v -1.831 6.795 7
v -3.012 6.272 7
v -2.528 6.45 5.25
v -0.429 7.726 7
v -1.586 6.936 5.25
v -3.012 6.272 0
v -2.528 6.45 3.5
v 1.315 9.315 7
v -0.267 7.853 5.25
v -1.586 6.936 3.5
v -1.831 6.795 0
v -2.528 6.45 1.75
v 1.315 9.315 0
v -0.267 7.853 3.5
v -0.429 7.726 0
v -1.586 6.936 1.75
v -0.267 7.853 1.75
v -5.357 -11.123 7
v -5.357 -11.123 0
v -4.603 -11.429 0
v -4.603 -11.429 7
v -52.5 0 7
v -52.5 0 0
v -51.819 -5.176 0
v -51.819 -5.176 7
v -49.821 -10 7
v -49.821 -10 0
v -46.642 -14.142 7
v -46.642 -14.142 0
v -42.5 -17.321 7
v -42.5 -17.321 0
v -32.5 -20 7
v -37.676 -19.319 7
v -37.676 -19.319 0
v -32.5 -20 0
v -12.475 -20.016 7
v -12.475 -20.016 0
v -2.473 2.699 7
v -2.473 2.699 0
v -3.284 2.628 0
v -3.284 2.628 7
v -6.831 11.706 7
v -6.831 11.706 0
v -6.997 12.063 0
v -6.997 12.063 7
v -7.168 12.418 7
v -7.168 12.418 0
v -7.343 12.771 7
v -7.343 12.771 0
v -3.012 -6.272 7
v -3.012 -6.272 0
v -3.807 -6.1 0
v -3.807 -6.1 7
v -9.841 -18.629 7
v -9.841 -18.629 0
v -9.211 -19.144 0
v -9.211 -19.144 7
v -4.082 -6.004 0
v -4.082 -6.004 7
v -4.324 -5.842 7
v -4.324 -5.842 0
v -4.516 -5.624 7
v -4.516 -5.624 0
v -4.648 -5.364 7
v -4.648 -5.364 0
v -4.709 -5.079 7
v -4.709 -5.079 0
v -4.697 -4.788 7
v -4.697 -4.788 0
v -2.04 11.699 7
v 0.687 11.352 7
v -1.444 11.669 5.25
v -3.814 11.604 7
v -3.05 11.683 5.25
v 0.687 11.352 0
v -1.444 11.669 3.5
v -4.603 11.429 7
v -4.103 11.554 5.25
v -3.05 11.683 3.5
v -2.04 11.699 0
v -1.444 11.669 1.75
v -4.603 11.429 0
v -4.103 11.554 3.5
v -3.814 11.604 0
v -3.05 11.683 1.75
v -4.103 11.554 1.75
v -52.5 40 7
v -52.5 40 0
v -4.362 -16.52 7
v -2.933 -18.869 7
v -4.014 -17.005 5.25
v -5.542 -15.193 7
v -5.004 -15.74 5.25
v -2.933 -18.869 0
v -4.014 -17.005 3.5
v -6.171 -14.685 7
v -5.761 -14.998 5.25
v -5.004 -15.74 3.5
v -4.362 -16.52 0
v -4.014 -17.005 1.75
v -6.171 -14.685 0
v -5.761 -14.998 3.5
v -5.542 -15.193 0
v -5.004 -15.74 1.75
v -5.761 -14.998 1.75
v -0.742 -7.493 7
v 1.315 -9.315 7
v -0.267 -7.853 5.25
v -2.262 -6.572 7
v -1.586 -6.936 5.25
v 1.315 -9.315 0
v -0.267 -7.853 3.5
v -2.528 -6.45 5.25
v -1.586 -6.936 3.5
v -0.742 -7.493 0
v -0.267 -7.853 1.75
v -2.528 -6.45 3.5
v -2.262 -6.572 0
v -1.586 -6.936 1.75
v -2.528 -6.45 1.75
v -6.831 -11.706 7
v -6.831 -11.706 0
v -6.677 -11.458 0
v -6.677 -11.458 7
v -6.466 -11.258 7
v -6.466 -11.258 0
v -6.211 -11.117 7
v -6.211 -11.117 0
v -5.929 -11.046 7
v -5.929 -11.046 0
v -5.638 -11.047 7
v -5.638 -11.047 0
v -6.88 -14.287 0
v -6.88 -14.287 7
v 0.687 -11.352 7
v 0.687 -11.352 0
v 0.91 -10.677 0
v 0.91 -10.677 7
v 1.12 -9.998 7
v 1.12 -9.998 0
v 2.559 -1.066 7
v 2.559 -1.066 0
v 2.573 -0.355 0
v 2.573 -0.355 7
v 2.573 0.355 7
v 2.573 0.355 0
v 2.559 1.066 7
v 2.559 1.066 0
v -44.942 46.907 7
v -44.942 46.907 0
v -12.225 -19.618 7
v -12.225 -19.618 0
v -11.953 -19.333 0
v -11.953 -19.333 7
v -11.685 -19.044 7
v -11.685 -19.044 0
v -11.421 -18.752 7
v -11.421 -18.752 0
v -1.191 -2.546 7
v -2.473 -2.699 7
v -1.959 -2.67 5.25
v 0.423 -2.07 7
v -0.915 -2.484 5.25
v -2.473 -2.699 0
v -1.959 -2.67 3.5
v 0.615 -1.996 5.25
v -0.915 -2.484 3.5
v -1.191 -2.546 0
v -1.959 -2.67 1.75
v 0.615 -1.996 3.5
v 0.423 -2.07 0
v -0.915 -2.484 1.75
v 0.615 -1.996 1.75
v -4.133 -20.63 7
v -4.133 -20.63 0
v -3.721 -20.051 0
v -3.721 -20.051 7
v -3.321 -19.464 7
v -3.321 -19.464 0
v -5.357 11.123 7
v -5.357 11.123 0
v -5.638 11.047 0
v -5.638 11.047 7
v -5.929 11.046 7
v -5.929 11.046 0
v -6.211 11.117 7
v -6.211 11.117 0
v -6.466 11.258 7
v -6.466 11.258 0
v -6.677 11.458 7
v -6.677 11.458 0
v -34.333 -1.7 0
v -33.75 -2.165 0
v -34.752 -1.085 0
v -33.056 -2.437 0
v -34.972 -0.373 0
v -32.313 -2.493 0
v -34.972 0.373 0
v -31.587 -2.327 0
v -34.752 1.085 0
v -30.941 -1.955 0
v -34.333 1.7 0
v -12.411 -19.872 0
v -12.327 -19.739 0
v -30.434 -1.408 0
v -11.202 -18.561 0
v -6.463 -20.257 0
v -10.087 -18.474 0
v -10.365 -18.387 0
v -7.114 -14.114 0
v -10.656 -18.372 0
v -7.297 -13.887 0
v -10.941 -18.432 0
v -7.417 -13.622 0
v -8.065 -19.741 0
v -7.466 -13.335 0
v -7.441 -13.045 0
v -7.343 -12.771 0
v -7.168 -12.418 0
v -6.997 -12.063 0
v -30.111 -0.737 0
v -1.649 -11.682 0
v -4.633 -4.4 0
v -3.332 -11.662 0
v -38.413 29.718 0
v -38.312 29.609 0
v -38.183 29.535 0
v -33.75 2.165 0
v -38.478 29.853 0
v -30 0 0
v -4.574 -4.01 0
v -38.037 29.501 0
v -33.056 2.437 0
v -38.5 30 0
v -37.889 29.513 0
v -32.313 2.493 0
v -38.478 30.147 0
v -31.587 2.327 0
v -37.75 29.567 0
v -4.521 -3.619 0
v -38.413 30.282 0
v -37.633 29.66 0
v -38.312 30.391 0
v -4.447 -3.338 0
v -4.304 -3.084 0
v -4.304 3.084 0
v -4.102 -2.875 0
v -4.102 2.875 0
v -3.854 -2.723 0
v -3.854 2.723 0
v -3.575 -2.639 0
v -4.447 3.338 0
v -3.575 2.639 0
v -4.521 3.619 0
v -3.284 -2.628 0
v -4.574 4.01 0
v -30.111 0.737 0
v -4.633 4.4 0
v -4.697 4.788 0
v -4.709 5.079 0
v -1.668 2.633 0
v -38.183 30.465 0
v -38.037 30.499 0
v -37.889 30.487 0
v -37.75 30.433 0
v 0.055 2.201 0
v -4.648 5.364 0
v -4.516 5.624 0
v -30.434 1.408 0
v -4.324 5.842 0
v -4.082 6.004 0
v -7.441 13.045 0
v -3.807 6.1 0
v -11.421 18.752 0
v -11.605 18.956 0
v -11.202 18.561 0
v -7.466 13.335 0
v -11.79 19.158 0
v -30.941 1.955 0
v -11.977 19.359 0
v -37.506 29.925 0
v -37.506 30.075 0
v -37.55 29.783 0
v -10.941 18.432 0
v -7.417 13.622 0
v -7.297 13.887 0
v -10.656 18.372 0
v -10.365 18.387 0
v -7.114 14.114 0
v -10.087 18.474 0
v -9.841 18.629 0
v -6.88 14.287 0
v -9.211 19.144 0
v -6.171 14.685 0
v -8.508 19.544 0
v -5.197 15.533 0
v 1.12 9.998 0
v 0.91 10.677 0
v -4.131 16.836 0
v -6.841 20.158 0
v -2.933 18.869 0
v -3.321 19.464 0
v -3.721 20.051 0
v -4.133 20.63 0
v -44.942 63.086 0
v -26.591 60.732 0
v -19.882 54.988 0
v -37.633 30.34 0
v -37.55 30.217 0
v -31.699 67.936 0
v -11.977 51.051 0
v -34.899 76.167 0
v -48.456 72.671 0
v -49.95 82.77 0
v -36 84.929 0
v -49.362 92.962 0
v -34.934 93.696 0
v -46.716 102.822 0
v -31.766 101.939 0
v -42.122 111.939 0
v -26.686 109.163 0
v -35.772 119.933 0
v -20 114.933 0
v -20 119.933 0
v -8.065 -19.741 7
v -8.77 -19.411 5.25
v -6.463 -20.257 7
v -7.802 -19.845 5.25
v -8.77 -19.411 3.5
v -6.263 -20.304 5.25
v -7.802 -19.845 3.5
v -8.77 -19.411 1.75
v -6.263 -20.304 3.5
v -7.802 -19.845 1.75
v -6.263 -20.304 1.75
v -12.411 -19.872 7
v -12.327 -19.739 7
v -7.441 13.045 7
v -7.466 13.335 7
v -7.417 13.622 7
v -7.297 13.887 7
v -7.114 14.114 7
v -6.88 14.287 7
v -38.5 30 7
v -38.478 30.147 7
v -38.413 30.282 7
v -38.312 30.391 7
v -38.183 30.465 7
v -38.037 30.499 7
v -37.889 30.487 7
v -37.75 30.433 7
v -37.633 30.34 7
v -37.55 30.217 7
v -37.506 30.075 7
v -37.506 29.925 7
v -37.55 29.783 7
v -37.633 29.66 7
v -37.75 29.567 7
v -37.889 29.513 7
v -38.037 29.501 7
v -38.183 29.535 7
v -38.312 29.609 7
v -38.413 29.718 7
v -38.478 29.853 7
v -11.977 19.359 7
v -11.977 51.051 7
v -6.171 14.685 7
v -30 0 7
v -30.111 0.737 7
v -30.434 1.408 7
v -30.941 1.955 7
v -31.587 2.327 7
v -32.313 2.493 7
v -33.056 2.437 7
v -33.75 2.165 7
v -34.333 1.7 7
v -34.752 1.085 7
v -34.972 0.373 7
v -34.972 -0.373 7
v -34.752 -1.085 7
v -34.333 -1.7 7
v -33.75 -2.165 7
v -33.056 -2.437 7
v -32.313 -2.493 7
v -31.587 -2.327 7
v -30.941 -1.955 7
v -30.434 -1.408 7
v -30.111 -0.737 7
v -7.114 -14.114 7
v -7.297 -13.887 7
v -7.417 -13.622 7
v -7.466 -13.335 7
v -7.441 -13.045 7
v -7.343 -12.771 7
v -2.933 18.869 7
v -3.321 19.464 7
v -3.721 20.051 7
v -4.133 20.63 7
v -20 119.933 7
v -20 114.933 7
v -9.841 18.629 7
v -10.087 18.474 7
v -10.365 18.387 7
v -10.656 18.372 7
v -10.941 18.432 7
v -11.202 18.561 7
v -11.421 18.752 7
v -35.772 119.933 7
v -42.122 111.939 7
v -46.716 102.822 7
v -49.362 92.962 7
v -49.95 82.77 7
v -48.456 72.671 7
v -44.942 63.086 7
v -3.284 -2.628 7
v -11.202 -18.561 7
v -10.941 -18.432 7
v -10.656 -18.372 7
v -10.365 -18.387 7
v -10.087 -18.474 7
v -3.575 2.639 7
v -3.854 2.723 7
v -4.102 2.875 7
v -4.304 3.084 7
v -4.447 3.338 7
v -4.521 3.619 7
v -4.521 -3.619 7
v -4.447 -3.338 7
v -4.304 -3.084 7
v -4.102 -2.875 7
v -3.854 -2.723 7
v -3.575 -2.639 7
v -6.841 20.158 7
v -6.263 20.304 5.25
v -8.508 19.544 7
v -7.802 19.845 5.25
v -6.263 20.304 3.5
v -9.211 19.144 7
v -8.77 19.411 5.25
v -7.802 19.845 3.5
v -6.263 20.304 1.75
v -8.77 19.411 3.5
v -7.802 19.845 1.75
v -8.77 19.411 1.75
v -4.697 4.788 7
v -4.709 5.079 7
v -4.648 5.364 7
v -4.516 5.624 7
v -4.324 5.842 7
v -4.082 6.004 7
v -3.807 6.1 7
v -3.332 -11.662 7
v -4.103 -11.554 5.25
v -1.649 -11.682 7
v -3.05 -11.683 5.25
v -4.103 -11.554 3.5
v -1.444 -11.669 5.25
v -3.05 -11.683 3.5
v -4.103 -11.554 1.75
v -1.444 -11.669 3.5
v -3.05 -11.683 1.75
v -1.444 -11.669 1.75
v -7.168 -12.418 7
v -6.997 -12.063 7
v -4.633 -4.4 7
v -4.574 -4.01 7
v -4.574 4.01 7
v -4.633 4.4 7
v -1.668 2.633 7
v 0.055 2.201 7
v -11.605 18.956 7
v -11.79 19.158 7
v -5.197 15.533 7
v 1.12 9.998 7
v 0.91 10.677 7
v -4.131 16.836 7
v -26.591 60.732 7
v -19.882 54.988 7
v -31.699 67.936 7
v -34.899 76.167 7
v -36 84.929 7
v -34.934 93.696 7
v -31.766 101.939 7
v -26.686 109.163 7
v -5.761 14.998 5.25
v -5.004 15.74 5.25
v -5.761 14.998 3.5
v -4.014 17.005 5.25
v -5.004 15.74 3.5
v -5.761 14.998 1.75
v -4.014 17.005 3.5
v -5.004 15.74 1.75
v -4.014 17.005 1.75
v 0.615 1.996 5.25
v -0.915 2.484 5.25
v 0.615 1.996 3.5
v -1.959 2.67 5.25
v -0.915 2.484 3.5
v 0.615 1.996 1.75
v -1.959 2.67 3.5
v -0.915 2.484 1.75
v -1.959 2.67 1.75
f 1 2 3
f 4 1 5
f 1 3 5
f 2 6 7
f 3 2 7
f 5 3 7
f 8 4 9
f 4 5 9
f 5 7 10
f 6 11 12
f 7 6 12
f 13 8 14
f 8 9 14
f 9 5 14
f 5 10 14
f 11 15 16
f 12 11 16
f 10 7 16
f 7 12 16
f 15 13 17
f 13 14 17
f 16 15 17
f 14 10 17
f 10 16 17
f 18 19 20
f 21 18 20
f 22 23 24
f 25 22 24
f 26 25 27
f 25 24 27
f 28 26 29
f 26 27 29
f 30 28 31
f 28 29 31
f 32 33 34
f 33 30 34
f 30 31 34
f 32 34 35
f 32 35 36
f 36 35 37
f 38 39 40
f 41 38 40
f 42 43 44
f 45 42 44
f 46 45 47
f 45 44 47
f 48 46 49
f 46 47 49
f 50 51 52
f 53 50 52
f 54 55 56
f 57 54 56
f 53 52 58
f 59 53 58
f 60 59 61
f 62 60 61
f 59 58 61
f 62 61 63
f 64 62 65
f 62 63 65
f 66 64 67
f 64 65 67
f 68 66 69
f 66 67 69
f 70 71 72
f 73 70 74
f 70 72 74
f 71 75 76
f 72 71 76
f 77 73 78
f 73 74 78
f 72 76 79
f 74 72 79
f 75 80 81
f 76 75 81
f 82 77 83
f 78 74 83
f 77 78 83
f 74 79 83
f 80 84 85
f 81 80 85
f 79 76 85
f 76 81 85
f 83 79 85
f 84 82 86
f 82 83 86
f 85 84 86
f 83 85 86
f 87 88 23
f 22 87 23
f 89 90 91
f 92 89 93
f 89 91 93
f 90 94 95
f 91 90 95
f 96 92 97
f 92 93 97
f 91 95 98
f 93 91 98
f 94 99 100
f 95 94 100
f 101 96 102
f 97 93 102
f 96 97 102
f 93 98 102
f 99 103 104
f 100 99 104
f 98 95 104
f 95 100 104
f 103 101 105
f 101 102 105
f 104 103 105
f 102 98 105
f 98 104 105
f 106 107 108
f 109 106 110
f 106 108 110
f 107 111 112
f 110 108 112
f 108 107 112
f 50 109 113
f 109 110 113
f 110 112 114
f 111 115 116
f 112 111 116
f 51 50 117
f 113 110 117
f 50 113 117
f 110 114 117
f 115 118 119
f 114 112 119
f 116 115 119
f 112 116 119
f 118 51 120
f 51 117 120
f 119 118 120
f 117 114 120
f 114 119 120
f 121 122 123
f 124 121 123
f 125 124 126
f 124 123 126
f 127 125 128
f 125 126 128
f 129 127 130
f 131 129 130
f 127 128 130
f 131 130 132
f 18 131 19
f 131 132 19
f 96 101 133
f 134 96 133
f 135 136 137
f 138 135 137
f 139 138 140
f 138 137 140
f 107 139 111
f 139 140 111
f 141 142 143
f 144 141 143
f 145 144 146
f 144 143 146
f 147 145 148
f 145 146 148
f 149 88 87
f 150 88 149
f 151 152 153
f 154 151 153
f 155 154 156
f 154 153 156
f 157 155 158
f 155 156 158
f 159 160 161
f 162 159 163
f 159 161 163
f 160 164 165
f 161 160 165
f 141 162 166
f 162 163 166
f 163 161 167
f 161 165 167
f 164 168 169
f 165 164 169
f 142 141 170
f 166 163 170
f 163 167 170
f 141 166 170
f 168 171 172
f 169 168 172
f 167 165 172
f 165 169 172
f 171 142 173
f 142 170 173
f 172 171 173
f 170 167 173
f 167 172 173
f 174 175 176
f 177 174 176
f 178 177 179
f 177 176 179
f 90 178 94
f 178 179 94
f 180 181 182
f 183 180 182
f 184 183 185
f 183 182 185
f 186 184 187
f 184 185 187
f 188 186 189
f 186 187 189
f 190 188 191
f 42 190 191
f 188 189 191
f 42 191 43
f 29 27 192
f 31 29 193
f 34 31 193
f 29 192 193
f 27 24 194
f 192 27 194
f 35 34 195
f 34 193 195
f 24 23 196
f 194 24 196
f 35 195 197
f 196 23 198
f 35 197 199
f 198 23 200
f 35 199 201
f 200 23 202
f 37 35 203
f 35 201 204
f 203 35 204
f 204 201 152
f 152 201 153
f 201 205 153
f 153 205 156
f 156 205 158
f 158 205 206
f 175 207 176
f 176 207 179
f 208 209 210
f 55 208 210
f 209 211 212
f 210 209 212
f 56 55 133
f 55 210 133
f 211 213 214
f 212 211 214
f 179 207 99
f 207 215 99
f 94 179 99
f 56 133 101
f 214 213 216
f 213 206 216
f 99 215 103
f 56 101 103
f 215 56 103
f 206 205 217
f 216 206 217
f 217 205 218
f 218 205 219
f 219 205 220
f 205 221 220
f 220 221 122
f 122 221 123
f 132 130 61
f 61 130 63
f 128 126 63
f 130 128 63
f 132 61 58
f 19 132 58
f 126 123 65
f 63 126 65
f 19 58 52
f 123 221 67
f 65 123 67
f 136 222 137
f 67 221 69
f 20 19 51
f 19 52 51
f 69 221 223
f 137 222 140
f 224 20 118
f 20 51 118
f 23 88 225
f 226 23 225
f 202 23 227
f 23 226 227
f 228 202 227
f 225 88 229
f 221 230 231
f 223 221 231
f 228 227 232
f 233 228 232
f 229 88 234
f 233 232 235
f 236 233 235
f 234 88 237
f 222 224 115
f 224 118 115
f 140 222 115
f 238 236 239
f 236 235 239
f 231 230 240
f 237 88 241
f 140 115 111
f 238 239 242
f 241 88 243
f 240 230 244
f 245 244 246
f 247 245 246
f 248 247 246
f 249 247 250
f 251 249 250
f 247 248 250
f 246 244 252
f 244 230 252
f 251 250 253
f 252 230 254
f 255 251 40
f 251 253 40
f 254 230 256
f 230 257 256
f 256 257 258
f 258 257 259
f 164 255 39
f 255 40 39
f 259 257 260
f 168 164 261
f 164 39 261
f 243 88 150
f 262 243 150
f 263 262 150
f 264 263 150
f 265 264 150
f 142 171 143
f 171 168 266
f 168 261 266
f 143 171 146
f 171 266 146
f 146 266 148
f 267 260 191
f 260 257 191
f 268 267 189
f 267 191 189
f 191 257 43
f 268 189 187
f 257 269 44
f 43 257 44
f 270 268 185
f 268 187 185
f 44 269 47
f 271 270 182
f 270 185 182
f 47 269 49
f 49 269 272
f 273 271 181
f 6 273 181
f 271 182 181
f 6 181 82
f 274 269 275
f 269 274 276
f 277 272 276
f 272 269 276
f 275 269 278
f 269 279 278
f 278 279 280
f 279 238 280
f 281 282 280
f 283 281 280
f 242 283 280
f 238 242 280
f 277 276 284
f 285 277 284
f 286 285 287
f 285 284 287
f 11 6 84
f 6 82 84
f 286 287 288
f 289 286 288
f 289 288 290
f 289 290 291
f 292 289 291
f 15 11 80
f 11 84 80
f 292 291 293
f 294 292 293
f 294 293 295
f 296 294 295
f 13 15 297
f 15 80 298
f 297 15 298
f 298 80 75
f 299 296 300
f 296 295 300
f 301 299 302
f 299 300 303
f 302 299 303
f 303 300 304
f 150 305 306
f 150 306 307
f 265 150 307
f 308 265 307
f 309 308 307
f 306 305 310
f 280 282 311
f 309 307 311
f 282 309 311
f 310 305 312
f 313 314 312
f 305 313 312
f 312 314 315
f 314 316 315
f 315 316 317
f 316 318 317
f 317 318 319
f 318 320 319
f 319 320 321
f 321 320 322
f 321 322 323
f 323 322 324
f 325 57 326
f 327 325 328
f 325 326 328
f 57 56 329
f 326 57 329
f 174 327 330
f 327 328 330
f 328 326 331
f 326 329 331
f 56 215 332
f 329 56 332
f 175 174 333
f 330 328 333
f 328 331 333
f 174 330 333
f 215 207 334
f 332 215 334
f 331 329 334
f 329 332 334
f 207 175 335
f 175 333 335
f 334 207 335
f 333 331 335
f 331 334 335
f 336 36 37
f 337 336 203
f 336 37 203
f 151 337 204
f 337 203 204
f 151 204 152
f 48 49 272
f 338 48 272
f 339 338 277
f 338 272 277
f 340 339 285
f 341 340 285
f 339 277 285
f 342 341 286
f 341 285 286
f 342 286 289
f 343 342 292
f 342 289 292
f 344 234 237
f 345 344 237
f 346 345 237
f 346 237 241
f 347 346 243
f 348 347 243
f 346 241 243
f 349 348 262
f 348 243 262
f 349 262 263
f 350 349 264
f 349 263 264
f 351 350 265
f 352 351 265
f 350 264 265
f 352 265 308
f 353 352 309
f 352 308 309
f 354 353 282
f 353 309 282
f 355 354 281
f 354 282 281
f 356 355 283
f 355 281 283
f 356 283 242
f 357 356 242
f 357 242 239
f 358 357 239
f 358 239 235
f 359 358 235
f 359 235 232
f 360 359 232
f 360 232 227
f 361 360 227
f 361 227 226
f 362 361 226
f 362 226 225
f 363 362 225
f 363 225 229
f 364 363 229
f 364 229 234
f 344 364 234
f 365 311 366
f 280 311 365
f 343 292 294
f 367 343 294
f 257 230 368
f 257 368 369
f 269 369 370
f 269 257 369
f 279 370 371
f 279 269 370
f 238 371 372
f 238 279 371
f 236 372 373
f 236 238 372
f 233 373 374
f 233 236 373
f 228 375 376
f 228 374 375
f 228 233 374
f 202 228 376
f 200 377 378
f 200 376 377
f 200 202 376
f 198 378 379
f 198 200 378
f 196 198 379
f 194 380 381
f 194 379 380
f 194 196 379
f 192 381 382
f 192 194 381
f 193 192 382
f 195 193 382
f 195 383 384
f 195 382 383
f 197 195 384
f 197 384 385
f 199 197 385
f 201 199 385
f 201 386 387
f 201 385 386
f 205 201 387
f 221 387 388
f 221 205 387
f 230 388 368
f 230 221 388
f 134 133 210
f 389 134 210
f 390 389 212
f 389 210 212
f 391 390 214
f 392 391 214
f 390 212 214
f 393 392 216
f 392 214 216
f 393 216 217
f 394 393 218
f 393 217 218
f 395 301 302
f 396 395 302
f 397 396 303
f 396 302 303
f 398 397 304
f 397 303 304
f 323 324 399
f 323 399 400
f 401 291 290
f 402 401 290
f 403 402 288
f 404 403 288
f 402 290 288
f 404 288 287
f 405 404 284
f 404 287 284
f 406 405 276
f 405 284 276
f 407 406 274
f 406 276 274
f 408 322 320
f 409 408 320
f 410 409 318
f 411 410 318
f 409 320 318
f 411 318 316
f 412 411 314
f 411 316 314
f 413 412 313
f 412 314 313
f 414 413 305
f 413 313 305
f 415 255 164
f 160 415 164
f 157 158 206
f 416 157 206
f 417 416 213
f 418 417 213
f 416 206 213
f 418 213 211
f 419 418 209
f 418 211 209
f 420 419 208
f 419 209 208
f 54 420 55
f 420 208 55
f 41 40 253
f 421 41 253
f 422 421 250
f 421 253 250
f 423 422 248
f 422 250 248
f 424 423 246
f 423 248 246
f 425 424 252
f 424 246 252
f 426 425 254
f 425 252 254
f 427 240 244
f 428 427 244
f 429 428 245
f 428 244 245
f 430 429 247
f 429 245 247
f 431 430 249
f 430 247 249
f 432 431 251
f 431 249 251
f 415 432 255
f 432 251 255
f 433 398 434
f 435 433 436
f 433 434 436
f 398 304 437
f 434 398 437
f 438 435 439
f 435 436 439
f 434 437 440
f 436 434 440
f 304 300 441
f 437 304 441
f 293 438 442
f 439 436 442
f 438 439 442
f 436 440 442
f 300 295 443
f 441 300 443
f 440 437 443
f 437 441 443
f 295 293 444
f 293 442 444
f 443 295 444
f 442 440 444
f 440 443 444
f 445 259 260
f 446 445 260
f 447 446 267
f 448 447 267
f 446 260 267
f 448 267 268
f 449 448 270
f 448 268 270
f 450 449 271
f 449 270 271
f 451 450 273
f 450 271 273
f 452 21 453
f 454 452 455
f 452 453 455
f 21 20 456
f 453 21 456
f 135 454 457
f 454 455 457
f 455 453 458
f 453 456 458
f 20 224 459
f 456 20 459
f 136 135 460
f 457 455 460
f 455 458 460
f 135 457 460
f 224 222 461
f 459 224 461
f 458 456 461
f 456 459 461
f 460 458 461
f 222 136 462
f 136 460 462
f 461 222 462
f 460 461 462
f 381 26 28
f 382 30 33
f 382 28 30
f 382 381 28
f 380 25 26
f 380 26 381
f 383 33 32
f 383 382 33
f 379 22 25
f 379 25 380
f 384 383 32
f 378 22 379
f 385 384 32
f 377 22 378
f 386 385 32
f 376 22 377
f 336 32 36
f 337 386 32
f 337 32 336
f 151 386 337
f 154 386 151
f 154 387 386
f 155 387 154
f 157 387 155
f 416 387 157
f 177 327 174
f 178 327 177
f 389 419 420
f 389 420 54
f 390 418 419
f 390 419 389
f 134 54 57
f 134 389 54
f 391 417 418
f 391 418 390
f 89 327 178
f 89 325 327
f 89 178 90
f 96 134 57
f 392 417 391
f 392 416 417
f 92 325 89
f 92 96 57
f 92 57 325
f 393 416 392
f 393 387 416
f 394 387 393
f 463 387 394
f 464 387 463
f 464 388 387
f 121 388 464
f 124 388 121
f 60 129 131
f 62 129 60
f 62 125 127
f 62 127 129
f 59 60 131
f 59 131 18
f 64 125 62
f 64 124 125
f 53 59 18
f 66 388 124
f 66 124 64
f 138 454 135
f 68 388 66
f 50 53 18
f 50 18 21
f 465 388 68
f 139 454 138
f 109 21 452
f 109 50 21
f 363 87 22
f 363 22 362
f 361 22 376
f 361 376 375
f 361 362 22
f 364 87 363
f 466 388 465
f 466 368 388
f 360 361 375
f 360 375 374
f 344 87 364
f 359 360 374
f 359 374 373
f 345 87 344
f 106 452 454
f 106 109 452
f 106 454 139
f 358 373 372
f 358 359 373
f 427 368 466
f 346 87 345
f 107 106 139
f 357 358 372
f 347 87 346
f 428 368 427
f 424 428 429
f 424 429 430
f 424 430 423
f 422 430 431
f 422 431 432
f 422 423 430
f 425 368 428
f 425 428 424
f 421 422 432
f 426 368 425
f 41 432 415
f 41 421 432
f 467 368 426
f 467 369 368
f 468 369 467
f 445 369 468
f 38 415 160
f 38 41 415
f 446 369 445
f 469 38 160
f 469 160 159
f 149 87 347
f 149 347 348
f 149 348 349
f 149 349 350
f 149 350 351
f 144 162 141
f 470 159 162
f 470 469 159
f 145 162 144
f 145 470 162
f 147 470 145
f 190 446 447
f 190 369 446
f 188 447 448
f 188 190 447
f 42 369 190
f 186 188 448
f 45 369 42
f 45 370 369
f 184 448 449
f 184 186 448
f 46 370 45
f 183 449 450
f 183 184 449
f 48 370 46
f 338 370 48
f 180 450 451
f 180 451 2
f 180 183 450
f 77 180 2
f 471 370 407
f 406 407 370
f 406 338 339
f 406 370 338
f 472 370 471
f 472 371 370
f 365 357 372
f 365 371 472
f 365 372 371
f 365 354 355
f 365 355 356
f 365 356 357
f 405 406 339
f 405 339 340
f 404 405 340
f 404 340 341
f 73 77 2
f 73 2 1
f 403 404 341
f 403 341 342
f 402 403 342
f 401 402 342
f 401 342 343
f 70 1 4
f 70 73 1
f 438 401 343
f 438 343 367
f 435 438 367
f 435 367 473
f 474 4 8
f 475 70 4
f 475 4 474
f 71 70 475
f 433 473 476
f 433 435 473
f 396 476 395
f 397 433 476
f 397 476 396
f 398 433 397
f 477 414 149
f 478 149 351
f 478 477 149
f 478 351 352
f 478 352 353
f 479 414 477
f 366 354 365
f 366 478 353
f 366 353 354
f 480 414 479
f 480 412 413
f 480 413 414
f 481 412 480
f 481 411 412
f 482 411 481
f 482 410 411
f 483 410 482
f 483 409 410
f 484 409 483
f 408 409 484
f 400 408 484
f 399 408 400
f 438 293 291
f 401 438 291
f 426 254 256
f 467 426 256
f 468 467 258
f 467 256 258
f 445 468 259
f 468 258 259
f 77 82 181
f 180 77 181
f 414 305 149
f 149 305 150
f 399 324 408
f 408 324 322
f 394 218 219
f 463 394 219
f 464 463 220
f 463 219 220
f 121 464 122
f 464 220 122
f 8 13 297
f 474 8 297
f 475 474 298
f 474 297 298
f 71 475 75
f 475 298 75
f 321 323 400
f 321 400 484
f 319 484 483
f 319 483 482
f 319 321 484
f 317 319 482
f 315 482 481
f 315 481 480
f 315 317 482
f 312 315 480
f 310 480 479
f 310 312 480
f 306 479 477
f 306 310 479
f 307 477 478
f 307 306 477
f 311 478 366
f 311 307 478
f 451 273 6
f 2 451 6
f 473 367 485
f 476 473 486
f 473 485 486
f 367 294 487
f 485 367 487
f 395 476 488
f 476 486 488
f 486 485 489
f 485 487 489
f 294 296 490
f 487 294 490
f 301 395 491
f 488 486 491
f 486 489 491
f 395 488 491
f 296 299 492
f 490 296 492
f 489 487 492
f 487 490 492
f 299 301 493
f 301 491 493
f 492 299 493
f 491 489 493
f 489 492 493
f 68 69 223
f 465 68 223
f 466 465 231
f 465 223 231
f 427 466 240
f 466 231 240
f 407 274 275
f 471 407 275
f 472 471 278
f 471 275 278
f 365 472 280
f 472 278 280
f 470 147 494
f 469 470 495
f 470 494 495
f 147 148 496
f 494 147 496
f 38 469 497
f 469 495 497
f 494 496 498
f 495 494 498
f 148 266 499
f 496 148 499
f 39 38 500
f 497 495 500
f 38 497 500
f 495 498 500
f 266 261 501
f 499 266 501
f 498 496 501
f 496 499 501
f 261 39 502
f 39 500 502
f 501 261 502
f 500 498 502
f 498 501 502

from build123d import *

# Parameters (mm, degrees)
CYLINDER002_R     = 0.5
CYLINDER002_DEPTH = 15
SKETCH002_W       = 3.675859
SKETCH002_H       = 9.820133
PAD002_DEPTH      = 10
CYLINDER001_R     = 2.5
CYLINDER001_DEPTH = 30
PAD_DEPTH         = 7
PAD001_DEPTH      = 7


with BuildPart() as fixation_servo:
    # Cylinder002 → Cylinder002 (new body)
    with BuildSketch(Plane(origin=(38, 30, 0), x_dir=(1, 0, 0), z_dir=(0, 0, 1))):
        Circle(CYLINDER002_R)
    extrude(amount=CYLINDER002_DEPTH)


with BuildPart() as part_mirroring001:
    # Part__Mirroring001: instance of fixation_servo
    add(fixation_servo.part.mirror(Plane(origin=(0, 0, 0), x_dir=(0, -1, 0), z_dir=(1, 0, 0))))


with BuildPart() as gearcutter_g:
    # Sketch002 → Pad002 (new body)
    with BuildSketch(Plane.XY):
        with BuildLine():
            Line((-20, 35), (-38.772621, 35))
            Line((-38.772621, 35), (-38.772621, -38.212818))
            Line((-38.772621, -38.212818), (39.418999, -38.212818))
            Line((20.044458, -20.01598), (39.418999, -38.212818))
            Line((0, -20), (20.044458, -20.01598))
            ThreePointArc((-20, 0), (-14.142136, -14.142136), (0, -20))
            Line((-20, 35), (-20, 0))
        make_face()
        with Locations((21.83793, 25.089934)):
            Rectangle(SKETCH002_W, SKETCH002_H)
    extrude(amount=PAD002_DEPTH)


with BuildPart() as hole:
    # Cylinder001 → Cylinder001 (new body)
    with BuildSketch(Plane.XY.offset(-10)):
        Circle(CYLINDER001_R)
    extrude(amount=CYLINDER001_DEPTH)


with BuildPart() as cut001:
    # InvoluteGear → Pad (new body)
    with BuildSketch(Plane.XY):
        with BuildLine():
            Line((29.216017, -2.627852), (30.02668, -2.698596))
            add(Edge.make_bspline(
                [(30.02668, -2.698596), (30.269336, -2.702327), (31.240634, -2.684194), (32.940327, -2.265756), (35.058609, -1.065575)],
                knots=[0, 0, 0, 0, 0, 1, 1, 1, 1, 1], degree=4))
            ThreePointArc((35.058609, -1.065575), (35.074799, 0), (35.058609, 1.065575))
            add(Edge.make_bspline(
                [(35.058609, 1.065575), (32.940327, 2.265756), (31.240634, 2.684194), (30.269336, 2.702327), (30.02668, 2.698596)],
                knots=[0, 0, 0, 0, 0, 1, 1, 1, 1, 1], degree=4))
            Line((30.02668, 2.698596), (29.216017, 2.627852))
            ThreePointArc((29.216017, 2.627852), (28.398075, 2.874673), (27.979368, 3.61941))
            ThreePointArc((27.979368, 3.61941), (27.89739, 4.204855), (27.803163, 4.788454))
            ThreePointArc((27.803163, 4.788454), (27.983753, 5.62352), (28.692604, 6.100468))
            Line((28.692604, 6.100468), (29.488104, 6.271815))
            add(Edge.make_bspline(
                [(29.488104, 6.271815), (29.72108, 6.339774), (30.64388, 6.643396), (32.144724, 7.544237), (33.815137, 9.315472)],
                knots=[0, 0, 0, 0, 0, 1, 1, 1, 1, 1], degree=4))
            ThreePointArc((33.815137, 9.315472), (33.516524, 10.338478), (33.18697, 11.351941))
            add(Edge.make_bspline(
                [(33.18697, 11.351941), (30.809038, 11.874427), (29.06152, 11.773281), (28.12803, 11.504313), (27.897254, 11.429224)],
                knots=[0, 0, 0, 0, 0, 1, 1, 1, 1, 1], degree=4))
            Line((27.897254, 11.429224), (27.143458, 11.122676))
            ThreePointArc((27.143458, 11.122676), (26.289104, 11.117439), (25.669483, 11.705673))
            ThreePointArc((25.669483, 11.705673), (25.418584, 12.240945), (25.156525, 12.770842))
            ThreePointArc((25.156525, 12.770842), (25.082952, 13.622039), (25.619728, 14.286735))
            Line((25.619728, 14.286735), (26.32938, 14.684947))
            add(Edge.make_bspline(
                [(26.32938, 14.684947), (26.531974, 14.818557), (27.324283, 15.380691), (28.492921, 16.683892), (29.567042, 18.868799)],
                knots=[0, 0, 0, 0, 0, 1, 1, 1, 1, 1], degree=4))
            ThreePointArc((29.567042, 18.868799), (28.980159, 19.758338), (28.366523, 20.629637))
            add(Edge.make_bspline(
                [(28.366523, 20.629637), (25.94023, 20.428003), (24.300163, 19.816261), (23.487425, 19.284092), (23.289034, 19.144315)],
                knots=[0, 0, 0, 0, 0, 1, 1, 1, 1, 1], degree=4))
            Line((23.289034, 19.144315), (22.659084, 18.629202))
            ThreePointArc((22.659084, 18.629202), (21.84423, 18.372372), (21.078752, 18.751836))
            ThreePointArc((21.078752, 18.751836), (20.681226, 19.189373), (20.274619, 19.618485))
            ThreePointArc((20.274619, 19.618485), (19.95342, 20.41018), (20.270426, 21.203563))
            Line((20.270426, 21.203563), (20.831176, 21.793257))
            add(Edge.make_bspline(
                [(20.831176, 21.793257), (20.985387, 21.980647), (21.576804, 22.751344), (22.309397, 24.341109), (22.691785, 26.745549)],
                knots=[0, 0, 0, 0, 0, 1, 1, 1, 1, 1], degree=4))
            ThreePointArc((22.691785, 26.745549), (21.868779, 27.422582), (21.025585, 28.074299))
            add(Edge.make_bspline(
                [(21.025585, 28.074299), (18.766519, 27.166461), (17.37963, 26.098479), (16.759858, 25.350393), (16.611482, 25.15835)],
                knots=[0, 0, 0, 0, 0, 1, 1, 1, 1, 1], degree=4))
            Line((16.611482, 25.15835), (16.161351, 24.480441))
            ThreePointArc((16.161351, 24.480441), (15.4584, 23.994839), (14.615082, 24.131816))
            ThreePointArc((14.615082, 24.131816), (14.10625, 24.432742), (13.591225, 24.72294))
            ThreePointArc((13.591225, 24.72294), (13.05094, 25.384787), (13.120008, 26.236361))
            Line((13.120008, 26.236361), (13.48203, 26.96514))
            add(Edge.make_bspline(
                [(13.48203, 26.96514), (13.574155, 27.18966), (13.912131, 28.10044), (14.143586, 29.835512), (13.800264, 32.245841)],
                knots=[0, 0, 0, 0, 0, 1, 1, 1, 1, 1], degree=4))
            ThreePointArc((13.800264, 32.245841), (12.814263, 32.65021), (11.816433, 33.024437))
            add(Edge.make_bspline(
                [(11.816433, 33.024437), (9.92532, 31.49106), (8.91484, 30.061732), (8.543105, 29.164202), (8.457926, 28.936956)],
                knots=[0, 0, 0, 0, 0, 1, 1, 1, 1, 1], degree=4))
            Line((8.457926, 28.936956), (8.227611, 28.156485))
            ThreePointArc((8.227611, 28.156485), (7.699024, 27.485259), (6.852797, 27.367578))
            ThreePointArc((6.852797, 27.367578), (6.277872, 27.505154), (5.70019, 27.630653))
            ThreePointArc((5.70019, 27.630653), (4.988826, 28.103844), (4.80382, 28.937943))
            Line((4.80382, 28.937943), (4.934946, 29.741053))
            add(Edge.make_bspline(
                [(4.934946, 29.741053), (4.956801, 29.982752), (5.011304, 30.952689), (4.721054, 32.678899), (3.682528, 34.880948)],
                knots=[0, 0, 0, 0, 0, 1, 1, 1, 1, 1], degree=4))
            ThreePointArc((3.682528, 34.880948), (2.621143, 34.976723), (1.557338, 35.040209))
            add(Edge.make_bspline(
                [(1.557338, 35.040209), (0.202213, 33.01754), (-0.342073, 31.353869), (-0.43274, 30.386642), (-0.447153, 30.144385)],
                knots=[0, 0, 0, 0, 0, 1, 1, 1, 1, 1], degree=4))
            Line((-0.447153, 30.144385), (-0.437188, 29.330703))
            ThreePointArc((-0.437188, 29.330703), (-0.744444, 28.533493), (-1.518389, 28.171611))
            ThreePointArc((-1.518389, 28.171611), (-2.108323, 28.133612), (-2.697331, 28.083261))
            ThreePointArc((-2.697331, 28.083261), (-3.516567, 28.325751), (-3.939209, 29.068262))
            Line((-3.939209, 29.068262), (-4.050629, 29.874342))
            add(Edge.make_bspline(
                [(-4.050629, 29.874342), (-4.100987, 30.111745), (-4.3348, 31.054656), (-5.120964, 32.618623), (-6.762416, 34.416729)],
                knots=[0, 0, 0, 0, 0, 1, 1, 1, 1, 1], degree=4))
            ThreePointArc((-6.762416, 34.416729), (-7.804877, 34.195401), (-8.840133, 33.942504))
            add(Edge.make_bspline(
                [(-8.840133, 33.942504), (-9.538861, 31.610267), (-9.56859, 29.860077), (-9.370135, 28.909097), (-9.312501, 28.673354)],
                knots=[0, 0, 0, 0, 0, 1, 1, 1, 1, 1], degree=4))
            Line((-9.312501, 28.673354), (-9.063142, 27.898758))
            ThreePointArc((-9.063142, 27.898758), (-9.121765, 27.046401), (-9.754659, 26.472472))
            ThreePointArc((-9.754659, 26.472472), (-10.307184, 26.262276), (-10.855183, 26.040548))
            ThreePointArc((-10.855183, 26.040548), (-11.709498, 26.030791), (-12.332222, 26.615739))
            Line((-12.332222, 26.615739), (-12.676288, 27.353165))
            add(Edge.make_bspline(
                [(-12.676288, 27.353165), (-12.794385, 27.565178), (-13.295737, 28.39728), (-14.507962, 29.660038), (-16.60649, 30.894434)],
                knots=[0, 0, 0, 0, 0, 1, 1, 1, 1, 1], degree=4))
            ThreePointArc((-16.60649, 30.894434), (-17.537399, 30.375667), (-18.452119, 29.828859))
            add(Edge.make_bspline(
                [(-18.452119, 29.828859), (-18.432366, 27.394282), (-17.944897, 25.713086), (-17.474952, 24.862851), (-17.350392, 24.65457)],
                knots=[0, 0, 0, 0, 0, 1, 1, 1, 1, 1], degree=4))
            Line((-17.350392, 24.65457), (-16.883795, 23.987887))
            ThreePointArc((-16.883795, 23.987887), (-16.688578, 23.156118), (-17.124185, 22.421138))
            ThreePointArc((-17.124185, 22.421138), (-17.590206, 22.057421), (-18.048504, 21.684019))
            ThreePointArc((-18.048504, 21.684019), (-18.861988, 21.422881), (-19.629463, 21.79829))
            Line((-19.629463, 21.79829), (-20.175603, 22.401539))
            add(Edge.make_bspline(
                [(-20.175603, 22.401539), (-20.350945, 22.569323), (-21.07529, 23.216681), (-22.605863, 24.066029), (-24.975004, 24.627032)],
                knots=[0, 0, 0, 0, 0, 1, 1, 1, 1, 1], degree=4))
            ThreePointArc((-24.975004, 24.627032), (-25.711647, 23.856922), (-26.424554, 23.064789))
            add(Edge.make_bspline(
                [(-26.424554, 23.064789), (-25.688074, 20.744196), (-24.726721, 19.281374), (-24.027043, 18.607432), (-23.846625, 18.445118)],
                knots=[0, 0, 0, 0, 0, 1, 1, 1, 1, 1], degree=4))
            Line((-23.846625, 18.445118), (-23.204249, 17.945586))
            ThreePointArc((-23.204249, 17.945586), (-22.772537, 17.208312), (-22.972152, 16.377588))
            ThreePointArc((-22.972152, 16.377588), (-23.310261, 15.892667), (-23.638136, 15.400768))
            ThreePointArc((-23.638136, 15.400768), (-24.338508, 14.911454), (-25.182539, 15.043968))
            Line((-25.182539, 15.043968), (-25.882227, 15.459439))
            add(Edge.make_bspline(
                [(-25.882227, 15.459439), (-26.099234, 15.568085), (-26.982211, 15.973178), (-28.695135, 16.333648), (-31.12438, 16.17141)],
                knots=[0, 0, 0, 0, 0, 1, 1, 1, 1, 1], degree=4))
            ThreePointArc((-31.12438, 16.17141), (-31.601302, 15.218385), (-32.049051, 14.251311))
            add(Edge.make_bspline(
                [(-32.049051, 14.251311), (-30.661284, 12.250897), (-29.311467, 11.136428), (-28.444225, 10.698661), (-28.22398, 10.596737)],
                knots=[0, 0, 0, 0, 0, 1, 1, 1, 1, 1], degree=4))
            Line((-28.22398, 10.596737), (-27.462904, 10.308742))
            ThreePointArc((-27.462904, 10.308742), (-26.833056, 9.731472), (-26.778943, 8.878817))
            ThreePointArc((-26.778943, 8.878817), (-26.959098, 8.31578), (-27.127416, 7.749093))
            ThreePointArc((-27.127416, 7.749093), (-27.652445, 7.075079), (-28.498037, 6.952923))
            Line((-28.498037, 6.952923), (-29.289102, 7.143699))
            add(Edge.make_bspline(
                [(-29.289102, 7.143699), (-29.528492, 7.183554), (-30.491644, 7.310388), (-32.234718, 7.14995), (-34.508218, 6.278888)],
                knots=[0, 0, 0, 0, 0, 1, 1, 1, 1, 1], degree=4))
            ThreePointArc((-34.508218, 6.278888), (-34.683042, 5.227628), (-34.825849, 4.171541))
            add(Edge.make_bspline(
                [(-34.825849, 4.171541), (-32.910105, 2.669052), (-31.29176, 2.001961), (-30.334014, 1.839267), (-30.093511, 1.80679)],
                knots=[0, 0, 0, 0, 0, 1, 1, 1, 1, 1], degree=4))
            Line((-30.093511, 1.80679), (-29.281359, 1.75592))
            ThreePointArc((-29.281359, 1.75592), (-28.50934, 1.389948), (-28.206307, 0.591124))
            ThreePointArc((-28.206307, 0.591124), (-28.2125, 0), (-28.206307, -0.591124))
            ThreePointArc((-28.206307, -0.591124), (-28.50934, -1.389948), (-29.281359, -1.75592))
            Line((-29.281359, -1.75592), (-30.093511, -1.80679))
            add(Edge.make_bspline(
                [(-30.093511, -1.80679), (-30.334014, -1.839267), (-31.29176, -2.001961), (-32.910105, -2.669052), (-34.825849, -4.171541)],
                knots=[0, 0, 0, 0, 0, 1, 1, 1, 1, 1], degree=4))
            ThreePointArc((-34.825849, -4.171541), (-34.683042, -5.227628), (-34.508218, -6.278888))
            add(Edge.make_bspline(
                [(-34.508218, -6.278888), (-32.234718, -7.14995), (-30.491644, -7.310388), (-29.528492, -7.183554), (-29.289102, -7.143699)],
                knots=[0, 0, 0, 0, 0, 1, 1, 1, 1, 1], degree=4))
            Line((-29.289102, -7.143699), (-28.498037, -6.952923))
            ThreePointArc((-28.498037, -6.952923), (-27.652445, -7.075079), (-27.127416, -7.749093))
            ThreePointArc((-27.127416, -7.749093), (-26.959098, -8.31578), (-26.778943, -8.878817))
            ThreePointArc((-26.778943, -8.878817), (-26.833056, -9.731472), (-27.462904, -10.308742))
            Line((-27.462904, -10.308742), (-28.22398, -10.596737))
            add(Edge.make_bspline(
                [(-28.22398, -10.596737), (-28.444225, -10.698661), (-29.311467, -11.136428), (-30.661284, -12.250897), (-32.049051, -14.251311)],
                knots=[0, 0, 0, 0, 0, 1, 1, 1, 1, 1], degree=4))
            ThreePointArc((-32.049051, -14.251311), (-31.601302, -15.218385), (-31.12438, -16.17141))
            add(Edge.make_bspline(
                [(-31.12438, -16.17141), (-28.695135, -16.333648), (-26.982211, -15.973178), (-26.099234, -15.568085), (-25.882227, -15.459439)],
                knots=[0, 0, 0, 0, 0, 1, 1, 1, 1, 1], degree=4))
            Line((-25.882227, -15.459439), (-25.182539, -15.043968))
            ThreePointArc((-25.182539, -15.043968), (-24.338508, -14.911454), (-23.638136, -15.400768))
            ThreePointArc((-23.638136, -15.400768), (-23.310261, -15.892667), (-22.972152, -16.377588))
            ThreePointArc((-22.972152, -16.377588), (-22.772537, -17.208312), (-23.204249, -17.945586))
            Line((-23.204249, -17.945586), (-23.846625, -18.445118))
            add(Edge.make_bspline(
                [(-23.846625, -18.445118), (-24.027043, -18.607432), (-24.726721, -19.281374), (-25.688074, -20.744196), (-26.424554, -23.064789)],
                knots=[0, 0, 0, 0, 0, 1, 1, 1, 1, 1], degree=4))
            ThreePointArc((-26.424554, -23.064789), (-25.711647, -23.856922), (-24.975004, -24.627032))
            add(Edge.make_bspline(
                [(-24.975004, -24.627032), (-22.605863, -24.066029), (-21.07529, -23.216681), (-20.350945, -22.569323), (-20.175603, -22.401539)],
                knots=[0, 0, 0, 0, 0, 1, 1, 1, 1, 1], degree=4))
            Line((-20.175603, -22.401539), (-19.629463, -21.79829))
            ThreePointArc((-19.629463, -21.79829), (-18.861988, -21.422881), (-18.048504, -21.684019))
            ThreePointArc((-18.048504, -21.684019), (-17.590206, -22.057421), (-17.124185, -22.421138))
            ThreePointArc((-17.124185, -22.421138), (-16.688578, -23.156118), (-16.883795, -23.987887))
            Line((-16.883795, -23.987887), (-17.350392, -24.65457))
            add(Edge.make_bspline(
                [(-17.350392, -24.65457), (-17.474952, -24.862851), (-17.944897, -25.713086), (-18.432366, -27.394282), (-18.452119, -29.828859)],
                knots=[0, 0, 0, 0, 0, 1, 1, 1, 1, 1], degree=4))
            ThreePointArc((-18.452119, -29.828859), (-17.537399, -30.375667), (-16.60649, -30.894434))
            add(Edge.make_bspline(
                [(-16.60649, -30.894434), (-14.507962, -29.660038), (-13.295737, -28.39728), (-12.794385, -27.565178), (-12.676288, -27.353165)],
                knots=[0, 0, 0, 0, 0, 1, 1, 1, 1, 1], degree=4))
            Line((-12.676288, -27.353165), (-12.332222, -26.615739))
            ThreePointArc((-12.332222, -26.615739), (-11.709498, -26.030791), (-10.855183, -26.040548))
            ThreePointArc((-10.855183, -26.040548), (-10.307184, -26.262276), (-9.754659, -26.472472))
            ThreePointArc((-9.754659, -26.472472), (-9.121765, -27.046401), (-9.063142, -27.898758))
            Line((-9.063142, -27.898758), (-9.312501, -28.673354))
            add(Edge.make_bspline(
                [(-9.312501, -28.673354), (-9.370135, -28.909097), (-9.56859, -29.860077), (-9.538861, -31.610267), (-8.840133, -33.942504)],
                knots=[0, 0, 0, 0, 0, 1, 1, 1, 1, 1], degree=4))
            ThreePointArc((-8.840133, -33.942504), (-7.804877, -34.195401), (-6.762416, -34.416729))
            add(Edge.make_bspline(
                [(-6.762416, -34.416729), (-5.120964, -32.618623), (-4.3348, -31.054656), (-4.100987, -30.111745), (-4.050629, -29.874342)],
                knots=[0, 0, 0, 0, 0, 1, 1, 1, 1, 1], degree=4))
            Line((-4.050629, -29.874342), (-3.939209, -29.068262))
            ThreePointArc((-3.939209, -29.068262), (-3.516567, -28.325751), (-2.697331, -28.083261))
            ThreePointArc((-2.697331, -28.083261), (-2.108323, -28.133612), (-1.518389, -28.171611))
            ThreePointArc((-1.518389, -28.171611), (-0.744444, -28.533493), (-0.437188, -29.330703))
            Line((-0.437188, -29.330703), (-0.447153, -30.144385))
            add(Edge.make_bspline(
                [(-0.447153, -30.144385), (-0.43274, -30.386642), (-0.342073, -31.353869), (0.202213, -33.01754), (1.557338, -35.040209)],
                knots=[0, 0, 0, 0, 0, 1, 1, 1, 1, 1], degree=4))
            ThreePointArc((1.557338, -35.040209), (2.621143, -34.976723), (3.682528, -34.880948))
            add(Edge.make_bspline(
                [(3.682528, -34.880948), (4.721054, -32.678899), (5.011304, -30.952689), (4.956801, -29.982752), (4.934946, -29.741053)],
                knots=[0, 0, 0, 0, 0, 1, 1, 1, 1, 1], degree=4))
            Line((4.934946, -29.741053), (4.80382, -28.937943))
            ThreePointArc((4.80382, -28.937943), (4.988826, -28.103844), (5.70019, -27.630653))
            ThreePointArc((5.70019, -27.630653), (6.277872, -27.505154), (6.852797, -27.367578))
            ThreePointArc((6.852797, -27.367578), (7.699024, -27.485259), (8.227611, -28.156485))
            Line((8.227611, -28.156485), (8.457926, -28.936956))
            add(Edge.make_bspline(
                [(8.457926, -28.936956), (8.543105, -29.164202), (8.91484, -30.061732), (9.92532, -31.49106), (11.816433, -33.024437)],
                knots=[0, 0, 0, 0, 0, 1, 1, 1, 1, 1], degree=4))
            ThreePointArc((11.816433, -33.024437), (12.814263, -32.65021), (13.800264, -32.245841))
            add(Edge.make_bspline(
                [(13.800264, -32.245841), (14.143586, -29.835512), (13.912131, -28.10044), (13.574155, -27.18966), (13.48203, -26.96514)],
                knots=[0, 0, 0, 0, 0, 1, 1, 1, 1, 1], degree=4))
            Line((13.48203, -26.96514), (13.120008, -26.236361))
            ThreePointArc((13.120008, -26.236361), (13.05094, -25.384787), (13.591225, -24.72294))
            ThreePointArc((13.591225, -24.72294), (14.10625, -24.432742), (14.615082, -24.131816))
            ThreePointArc((14.615082, -24.131816), (15.4584, -23.994839), (16.161351, -24.480441))
            Line((16.161351, -24.480441), (16.611482, -25.15835))
            add(Edge.make_bspline(
                [(16.611482, -25.15835), (16.759858, -25.350393), (17.37963, -26.098479), (18.766519, -27.166461), (21.025585, -28.074299)],
                knots=[0, 0, 0, 0, 0, 1, 1, 1, 1, 1], degree=4))
            ThreePointArc((21.025585, -28.074299), (21.868779, -27.422582), (22.691785, -26.745549))
            add(Edge.make_bspline(
                [(22.691785, -26.745549), (22.309397, -24.341109), (21.576804, -22.751344), (20.985387, -21.980647), (20.831176, -21.793257)],
                knots=[0, 0, 0, 0, 0, 1, 1, 1, 1, 1], degree=4))
            Line((20.831176, -21.793257), (20.270426, -21.203563))
            ThreePointArc((20.270426, -21.203563), (19.95342, -20.41018), (20.274619, -19.618485))
            ThreePointArc((20.274619, -19.618485), (20.681226, -19.189373), (21.078752, -18.751836))
            ThreePointArc((21.078752, -18.751836), (21.84423, -18.372372), (22.659084, -18.629202))
            Line((22.659084, -18.629202), (23.289034, -19.144315))
            add(Edge.make_bspline(
                [(23.289034, -19.144315), (23.487425, -19.284092), (24.300163, -19.816261), (25.94023, -20.428003), (28.366523, -20.629637)],
                knots=[0, 0, 0, 0, 0, 1, 1, 1, 1, 1], degree=4))
            ThreePointArc((28.366523, -20.629637), (28.980159, -19.758338), (29.567042, -18.868799))
            add(Edge.make_bspline(
                [(29.567042, -18.868799), (28.492921, -16.683892), (27.324283, -15.380691), (26.531974, -14.818557), (26.32938, -14.684947)],
                knots=[0, 0, 0, 0, 0, 1, 1, 1, 1, 1], degree=4))
            Line((26.32938, -14.684947), (25.619728, -14.286735))
            ThreePointArc((25.619728, -14.286735), (25.082952, -13.622039), (25.156525, -12.770842))
            ThreePointArc((25.156525, -12.770842), (25.418584, -12.240945), (25.669483, -11.705673))
            ThreePointArc((25.669483, -11.705673), (26.289104, -11.117439), (27.143458, -11.122676))
            Line((27.143458, -11.122676), (27.897254, -11.429224))
            add(Edge.make_bspline(
                [(27.897254, -11.429224), (28.12803, -11.504313), (29.06152, -11.773281), (30.809038, -11.874427), (33.18697, -11.351941)],
                knots=[0, 0, 0, 0, 0, 1, 1, 1, 1, 1], degree=4))
            ThreePointArc((33.18697, -11.351941), (33.516524, -10.338478), (33.815137, -9.315472))
            add(Edge.make_bspline(
                [(33.815137, -9.315472), (32.144724, -7.544237), (30.64388, -6.643396), (29.72108, -6.339774), (29.488104, -6.271815)],
                knots=[0, 0, 0, 0, 0, 1, 1, 1, 1, 1], degree=4))
            Line((29.488104, -6.271815), (28.692604, -6.100468))
            ThreePointArc((28.692604, -6.100468), (27.983753, -5.62352), (27.803163, -4.788454))
            ThreePointArc((27.803163, -4.788454), (27.89739, -4.204855), (27.979368, -3.61941))
            ThreePointArc((27.979368, -3.61941), (28.398075, -2.874673), (29.216017, -2.627852))
        make_face()
    extrude(amount=PAD_DEPTH)

    # Cut: cut hole
    add(hole.part, mode=Mode.SUBTRACT)

    # Cut001: cut gearcutter_g
    add(gearcutter_g.part, mode=Mode.SUBTRACT)


with BuildPart() as pince_g_servo:
    # Sketch001 → Pad001 (new body)
    with BuildSketch(Plane.XY):
        with BuildLine():
            Line((20.522763, 10), (-20, 10))
            Line((-20, 10), (-20, 40))
            Line((-20, 40), (-12.44178, 46.907085))
            Line((-12.44178, 63.085703), (-12.44178, 46.907085))
            ThreePointArc((-3.272439, 119.933259), (-16.862004, 92.961944), (-12.44178, 63.085703))
            Line((12.5, 119.933259), (-3.272439, 119.933259))
            Line((12.5, 119.933259), (12.5, 114.933259))
            ThreePointArc((12.5, 114.933259), (-3.21942, 80.514127), (20.522763, 51.050835))
            Line((20.522763, 51.050835), (20.522763, 10))
        make_face()
    extrude(amount=PAD001_DEPTH)

    # Fusion: union Cut001
    add(cut001.part)


with BuildPart() as pince_g_servo_1:
    # Clone012 placement: moved
    add(pince_g_servo.part.moved(Location((-32.5, 0, 0))))

    # Cut005: cut Part__Mirroring001
    add(part_mirroring001.part, mode=Mode.SUBTRACT)


solid = pince_g_servo_1.part
